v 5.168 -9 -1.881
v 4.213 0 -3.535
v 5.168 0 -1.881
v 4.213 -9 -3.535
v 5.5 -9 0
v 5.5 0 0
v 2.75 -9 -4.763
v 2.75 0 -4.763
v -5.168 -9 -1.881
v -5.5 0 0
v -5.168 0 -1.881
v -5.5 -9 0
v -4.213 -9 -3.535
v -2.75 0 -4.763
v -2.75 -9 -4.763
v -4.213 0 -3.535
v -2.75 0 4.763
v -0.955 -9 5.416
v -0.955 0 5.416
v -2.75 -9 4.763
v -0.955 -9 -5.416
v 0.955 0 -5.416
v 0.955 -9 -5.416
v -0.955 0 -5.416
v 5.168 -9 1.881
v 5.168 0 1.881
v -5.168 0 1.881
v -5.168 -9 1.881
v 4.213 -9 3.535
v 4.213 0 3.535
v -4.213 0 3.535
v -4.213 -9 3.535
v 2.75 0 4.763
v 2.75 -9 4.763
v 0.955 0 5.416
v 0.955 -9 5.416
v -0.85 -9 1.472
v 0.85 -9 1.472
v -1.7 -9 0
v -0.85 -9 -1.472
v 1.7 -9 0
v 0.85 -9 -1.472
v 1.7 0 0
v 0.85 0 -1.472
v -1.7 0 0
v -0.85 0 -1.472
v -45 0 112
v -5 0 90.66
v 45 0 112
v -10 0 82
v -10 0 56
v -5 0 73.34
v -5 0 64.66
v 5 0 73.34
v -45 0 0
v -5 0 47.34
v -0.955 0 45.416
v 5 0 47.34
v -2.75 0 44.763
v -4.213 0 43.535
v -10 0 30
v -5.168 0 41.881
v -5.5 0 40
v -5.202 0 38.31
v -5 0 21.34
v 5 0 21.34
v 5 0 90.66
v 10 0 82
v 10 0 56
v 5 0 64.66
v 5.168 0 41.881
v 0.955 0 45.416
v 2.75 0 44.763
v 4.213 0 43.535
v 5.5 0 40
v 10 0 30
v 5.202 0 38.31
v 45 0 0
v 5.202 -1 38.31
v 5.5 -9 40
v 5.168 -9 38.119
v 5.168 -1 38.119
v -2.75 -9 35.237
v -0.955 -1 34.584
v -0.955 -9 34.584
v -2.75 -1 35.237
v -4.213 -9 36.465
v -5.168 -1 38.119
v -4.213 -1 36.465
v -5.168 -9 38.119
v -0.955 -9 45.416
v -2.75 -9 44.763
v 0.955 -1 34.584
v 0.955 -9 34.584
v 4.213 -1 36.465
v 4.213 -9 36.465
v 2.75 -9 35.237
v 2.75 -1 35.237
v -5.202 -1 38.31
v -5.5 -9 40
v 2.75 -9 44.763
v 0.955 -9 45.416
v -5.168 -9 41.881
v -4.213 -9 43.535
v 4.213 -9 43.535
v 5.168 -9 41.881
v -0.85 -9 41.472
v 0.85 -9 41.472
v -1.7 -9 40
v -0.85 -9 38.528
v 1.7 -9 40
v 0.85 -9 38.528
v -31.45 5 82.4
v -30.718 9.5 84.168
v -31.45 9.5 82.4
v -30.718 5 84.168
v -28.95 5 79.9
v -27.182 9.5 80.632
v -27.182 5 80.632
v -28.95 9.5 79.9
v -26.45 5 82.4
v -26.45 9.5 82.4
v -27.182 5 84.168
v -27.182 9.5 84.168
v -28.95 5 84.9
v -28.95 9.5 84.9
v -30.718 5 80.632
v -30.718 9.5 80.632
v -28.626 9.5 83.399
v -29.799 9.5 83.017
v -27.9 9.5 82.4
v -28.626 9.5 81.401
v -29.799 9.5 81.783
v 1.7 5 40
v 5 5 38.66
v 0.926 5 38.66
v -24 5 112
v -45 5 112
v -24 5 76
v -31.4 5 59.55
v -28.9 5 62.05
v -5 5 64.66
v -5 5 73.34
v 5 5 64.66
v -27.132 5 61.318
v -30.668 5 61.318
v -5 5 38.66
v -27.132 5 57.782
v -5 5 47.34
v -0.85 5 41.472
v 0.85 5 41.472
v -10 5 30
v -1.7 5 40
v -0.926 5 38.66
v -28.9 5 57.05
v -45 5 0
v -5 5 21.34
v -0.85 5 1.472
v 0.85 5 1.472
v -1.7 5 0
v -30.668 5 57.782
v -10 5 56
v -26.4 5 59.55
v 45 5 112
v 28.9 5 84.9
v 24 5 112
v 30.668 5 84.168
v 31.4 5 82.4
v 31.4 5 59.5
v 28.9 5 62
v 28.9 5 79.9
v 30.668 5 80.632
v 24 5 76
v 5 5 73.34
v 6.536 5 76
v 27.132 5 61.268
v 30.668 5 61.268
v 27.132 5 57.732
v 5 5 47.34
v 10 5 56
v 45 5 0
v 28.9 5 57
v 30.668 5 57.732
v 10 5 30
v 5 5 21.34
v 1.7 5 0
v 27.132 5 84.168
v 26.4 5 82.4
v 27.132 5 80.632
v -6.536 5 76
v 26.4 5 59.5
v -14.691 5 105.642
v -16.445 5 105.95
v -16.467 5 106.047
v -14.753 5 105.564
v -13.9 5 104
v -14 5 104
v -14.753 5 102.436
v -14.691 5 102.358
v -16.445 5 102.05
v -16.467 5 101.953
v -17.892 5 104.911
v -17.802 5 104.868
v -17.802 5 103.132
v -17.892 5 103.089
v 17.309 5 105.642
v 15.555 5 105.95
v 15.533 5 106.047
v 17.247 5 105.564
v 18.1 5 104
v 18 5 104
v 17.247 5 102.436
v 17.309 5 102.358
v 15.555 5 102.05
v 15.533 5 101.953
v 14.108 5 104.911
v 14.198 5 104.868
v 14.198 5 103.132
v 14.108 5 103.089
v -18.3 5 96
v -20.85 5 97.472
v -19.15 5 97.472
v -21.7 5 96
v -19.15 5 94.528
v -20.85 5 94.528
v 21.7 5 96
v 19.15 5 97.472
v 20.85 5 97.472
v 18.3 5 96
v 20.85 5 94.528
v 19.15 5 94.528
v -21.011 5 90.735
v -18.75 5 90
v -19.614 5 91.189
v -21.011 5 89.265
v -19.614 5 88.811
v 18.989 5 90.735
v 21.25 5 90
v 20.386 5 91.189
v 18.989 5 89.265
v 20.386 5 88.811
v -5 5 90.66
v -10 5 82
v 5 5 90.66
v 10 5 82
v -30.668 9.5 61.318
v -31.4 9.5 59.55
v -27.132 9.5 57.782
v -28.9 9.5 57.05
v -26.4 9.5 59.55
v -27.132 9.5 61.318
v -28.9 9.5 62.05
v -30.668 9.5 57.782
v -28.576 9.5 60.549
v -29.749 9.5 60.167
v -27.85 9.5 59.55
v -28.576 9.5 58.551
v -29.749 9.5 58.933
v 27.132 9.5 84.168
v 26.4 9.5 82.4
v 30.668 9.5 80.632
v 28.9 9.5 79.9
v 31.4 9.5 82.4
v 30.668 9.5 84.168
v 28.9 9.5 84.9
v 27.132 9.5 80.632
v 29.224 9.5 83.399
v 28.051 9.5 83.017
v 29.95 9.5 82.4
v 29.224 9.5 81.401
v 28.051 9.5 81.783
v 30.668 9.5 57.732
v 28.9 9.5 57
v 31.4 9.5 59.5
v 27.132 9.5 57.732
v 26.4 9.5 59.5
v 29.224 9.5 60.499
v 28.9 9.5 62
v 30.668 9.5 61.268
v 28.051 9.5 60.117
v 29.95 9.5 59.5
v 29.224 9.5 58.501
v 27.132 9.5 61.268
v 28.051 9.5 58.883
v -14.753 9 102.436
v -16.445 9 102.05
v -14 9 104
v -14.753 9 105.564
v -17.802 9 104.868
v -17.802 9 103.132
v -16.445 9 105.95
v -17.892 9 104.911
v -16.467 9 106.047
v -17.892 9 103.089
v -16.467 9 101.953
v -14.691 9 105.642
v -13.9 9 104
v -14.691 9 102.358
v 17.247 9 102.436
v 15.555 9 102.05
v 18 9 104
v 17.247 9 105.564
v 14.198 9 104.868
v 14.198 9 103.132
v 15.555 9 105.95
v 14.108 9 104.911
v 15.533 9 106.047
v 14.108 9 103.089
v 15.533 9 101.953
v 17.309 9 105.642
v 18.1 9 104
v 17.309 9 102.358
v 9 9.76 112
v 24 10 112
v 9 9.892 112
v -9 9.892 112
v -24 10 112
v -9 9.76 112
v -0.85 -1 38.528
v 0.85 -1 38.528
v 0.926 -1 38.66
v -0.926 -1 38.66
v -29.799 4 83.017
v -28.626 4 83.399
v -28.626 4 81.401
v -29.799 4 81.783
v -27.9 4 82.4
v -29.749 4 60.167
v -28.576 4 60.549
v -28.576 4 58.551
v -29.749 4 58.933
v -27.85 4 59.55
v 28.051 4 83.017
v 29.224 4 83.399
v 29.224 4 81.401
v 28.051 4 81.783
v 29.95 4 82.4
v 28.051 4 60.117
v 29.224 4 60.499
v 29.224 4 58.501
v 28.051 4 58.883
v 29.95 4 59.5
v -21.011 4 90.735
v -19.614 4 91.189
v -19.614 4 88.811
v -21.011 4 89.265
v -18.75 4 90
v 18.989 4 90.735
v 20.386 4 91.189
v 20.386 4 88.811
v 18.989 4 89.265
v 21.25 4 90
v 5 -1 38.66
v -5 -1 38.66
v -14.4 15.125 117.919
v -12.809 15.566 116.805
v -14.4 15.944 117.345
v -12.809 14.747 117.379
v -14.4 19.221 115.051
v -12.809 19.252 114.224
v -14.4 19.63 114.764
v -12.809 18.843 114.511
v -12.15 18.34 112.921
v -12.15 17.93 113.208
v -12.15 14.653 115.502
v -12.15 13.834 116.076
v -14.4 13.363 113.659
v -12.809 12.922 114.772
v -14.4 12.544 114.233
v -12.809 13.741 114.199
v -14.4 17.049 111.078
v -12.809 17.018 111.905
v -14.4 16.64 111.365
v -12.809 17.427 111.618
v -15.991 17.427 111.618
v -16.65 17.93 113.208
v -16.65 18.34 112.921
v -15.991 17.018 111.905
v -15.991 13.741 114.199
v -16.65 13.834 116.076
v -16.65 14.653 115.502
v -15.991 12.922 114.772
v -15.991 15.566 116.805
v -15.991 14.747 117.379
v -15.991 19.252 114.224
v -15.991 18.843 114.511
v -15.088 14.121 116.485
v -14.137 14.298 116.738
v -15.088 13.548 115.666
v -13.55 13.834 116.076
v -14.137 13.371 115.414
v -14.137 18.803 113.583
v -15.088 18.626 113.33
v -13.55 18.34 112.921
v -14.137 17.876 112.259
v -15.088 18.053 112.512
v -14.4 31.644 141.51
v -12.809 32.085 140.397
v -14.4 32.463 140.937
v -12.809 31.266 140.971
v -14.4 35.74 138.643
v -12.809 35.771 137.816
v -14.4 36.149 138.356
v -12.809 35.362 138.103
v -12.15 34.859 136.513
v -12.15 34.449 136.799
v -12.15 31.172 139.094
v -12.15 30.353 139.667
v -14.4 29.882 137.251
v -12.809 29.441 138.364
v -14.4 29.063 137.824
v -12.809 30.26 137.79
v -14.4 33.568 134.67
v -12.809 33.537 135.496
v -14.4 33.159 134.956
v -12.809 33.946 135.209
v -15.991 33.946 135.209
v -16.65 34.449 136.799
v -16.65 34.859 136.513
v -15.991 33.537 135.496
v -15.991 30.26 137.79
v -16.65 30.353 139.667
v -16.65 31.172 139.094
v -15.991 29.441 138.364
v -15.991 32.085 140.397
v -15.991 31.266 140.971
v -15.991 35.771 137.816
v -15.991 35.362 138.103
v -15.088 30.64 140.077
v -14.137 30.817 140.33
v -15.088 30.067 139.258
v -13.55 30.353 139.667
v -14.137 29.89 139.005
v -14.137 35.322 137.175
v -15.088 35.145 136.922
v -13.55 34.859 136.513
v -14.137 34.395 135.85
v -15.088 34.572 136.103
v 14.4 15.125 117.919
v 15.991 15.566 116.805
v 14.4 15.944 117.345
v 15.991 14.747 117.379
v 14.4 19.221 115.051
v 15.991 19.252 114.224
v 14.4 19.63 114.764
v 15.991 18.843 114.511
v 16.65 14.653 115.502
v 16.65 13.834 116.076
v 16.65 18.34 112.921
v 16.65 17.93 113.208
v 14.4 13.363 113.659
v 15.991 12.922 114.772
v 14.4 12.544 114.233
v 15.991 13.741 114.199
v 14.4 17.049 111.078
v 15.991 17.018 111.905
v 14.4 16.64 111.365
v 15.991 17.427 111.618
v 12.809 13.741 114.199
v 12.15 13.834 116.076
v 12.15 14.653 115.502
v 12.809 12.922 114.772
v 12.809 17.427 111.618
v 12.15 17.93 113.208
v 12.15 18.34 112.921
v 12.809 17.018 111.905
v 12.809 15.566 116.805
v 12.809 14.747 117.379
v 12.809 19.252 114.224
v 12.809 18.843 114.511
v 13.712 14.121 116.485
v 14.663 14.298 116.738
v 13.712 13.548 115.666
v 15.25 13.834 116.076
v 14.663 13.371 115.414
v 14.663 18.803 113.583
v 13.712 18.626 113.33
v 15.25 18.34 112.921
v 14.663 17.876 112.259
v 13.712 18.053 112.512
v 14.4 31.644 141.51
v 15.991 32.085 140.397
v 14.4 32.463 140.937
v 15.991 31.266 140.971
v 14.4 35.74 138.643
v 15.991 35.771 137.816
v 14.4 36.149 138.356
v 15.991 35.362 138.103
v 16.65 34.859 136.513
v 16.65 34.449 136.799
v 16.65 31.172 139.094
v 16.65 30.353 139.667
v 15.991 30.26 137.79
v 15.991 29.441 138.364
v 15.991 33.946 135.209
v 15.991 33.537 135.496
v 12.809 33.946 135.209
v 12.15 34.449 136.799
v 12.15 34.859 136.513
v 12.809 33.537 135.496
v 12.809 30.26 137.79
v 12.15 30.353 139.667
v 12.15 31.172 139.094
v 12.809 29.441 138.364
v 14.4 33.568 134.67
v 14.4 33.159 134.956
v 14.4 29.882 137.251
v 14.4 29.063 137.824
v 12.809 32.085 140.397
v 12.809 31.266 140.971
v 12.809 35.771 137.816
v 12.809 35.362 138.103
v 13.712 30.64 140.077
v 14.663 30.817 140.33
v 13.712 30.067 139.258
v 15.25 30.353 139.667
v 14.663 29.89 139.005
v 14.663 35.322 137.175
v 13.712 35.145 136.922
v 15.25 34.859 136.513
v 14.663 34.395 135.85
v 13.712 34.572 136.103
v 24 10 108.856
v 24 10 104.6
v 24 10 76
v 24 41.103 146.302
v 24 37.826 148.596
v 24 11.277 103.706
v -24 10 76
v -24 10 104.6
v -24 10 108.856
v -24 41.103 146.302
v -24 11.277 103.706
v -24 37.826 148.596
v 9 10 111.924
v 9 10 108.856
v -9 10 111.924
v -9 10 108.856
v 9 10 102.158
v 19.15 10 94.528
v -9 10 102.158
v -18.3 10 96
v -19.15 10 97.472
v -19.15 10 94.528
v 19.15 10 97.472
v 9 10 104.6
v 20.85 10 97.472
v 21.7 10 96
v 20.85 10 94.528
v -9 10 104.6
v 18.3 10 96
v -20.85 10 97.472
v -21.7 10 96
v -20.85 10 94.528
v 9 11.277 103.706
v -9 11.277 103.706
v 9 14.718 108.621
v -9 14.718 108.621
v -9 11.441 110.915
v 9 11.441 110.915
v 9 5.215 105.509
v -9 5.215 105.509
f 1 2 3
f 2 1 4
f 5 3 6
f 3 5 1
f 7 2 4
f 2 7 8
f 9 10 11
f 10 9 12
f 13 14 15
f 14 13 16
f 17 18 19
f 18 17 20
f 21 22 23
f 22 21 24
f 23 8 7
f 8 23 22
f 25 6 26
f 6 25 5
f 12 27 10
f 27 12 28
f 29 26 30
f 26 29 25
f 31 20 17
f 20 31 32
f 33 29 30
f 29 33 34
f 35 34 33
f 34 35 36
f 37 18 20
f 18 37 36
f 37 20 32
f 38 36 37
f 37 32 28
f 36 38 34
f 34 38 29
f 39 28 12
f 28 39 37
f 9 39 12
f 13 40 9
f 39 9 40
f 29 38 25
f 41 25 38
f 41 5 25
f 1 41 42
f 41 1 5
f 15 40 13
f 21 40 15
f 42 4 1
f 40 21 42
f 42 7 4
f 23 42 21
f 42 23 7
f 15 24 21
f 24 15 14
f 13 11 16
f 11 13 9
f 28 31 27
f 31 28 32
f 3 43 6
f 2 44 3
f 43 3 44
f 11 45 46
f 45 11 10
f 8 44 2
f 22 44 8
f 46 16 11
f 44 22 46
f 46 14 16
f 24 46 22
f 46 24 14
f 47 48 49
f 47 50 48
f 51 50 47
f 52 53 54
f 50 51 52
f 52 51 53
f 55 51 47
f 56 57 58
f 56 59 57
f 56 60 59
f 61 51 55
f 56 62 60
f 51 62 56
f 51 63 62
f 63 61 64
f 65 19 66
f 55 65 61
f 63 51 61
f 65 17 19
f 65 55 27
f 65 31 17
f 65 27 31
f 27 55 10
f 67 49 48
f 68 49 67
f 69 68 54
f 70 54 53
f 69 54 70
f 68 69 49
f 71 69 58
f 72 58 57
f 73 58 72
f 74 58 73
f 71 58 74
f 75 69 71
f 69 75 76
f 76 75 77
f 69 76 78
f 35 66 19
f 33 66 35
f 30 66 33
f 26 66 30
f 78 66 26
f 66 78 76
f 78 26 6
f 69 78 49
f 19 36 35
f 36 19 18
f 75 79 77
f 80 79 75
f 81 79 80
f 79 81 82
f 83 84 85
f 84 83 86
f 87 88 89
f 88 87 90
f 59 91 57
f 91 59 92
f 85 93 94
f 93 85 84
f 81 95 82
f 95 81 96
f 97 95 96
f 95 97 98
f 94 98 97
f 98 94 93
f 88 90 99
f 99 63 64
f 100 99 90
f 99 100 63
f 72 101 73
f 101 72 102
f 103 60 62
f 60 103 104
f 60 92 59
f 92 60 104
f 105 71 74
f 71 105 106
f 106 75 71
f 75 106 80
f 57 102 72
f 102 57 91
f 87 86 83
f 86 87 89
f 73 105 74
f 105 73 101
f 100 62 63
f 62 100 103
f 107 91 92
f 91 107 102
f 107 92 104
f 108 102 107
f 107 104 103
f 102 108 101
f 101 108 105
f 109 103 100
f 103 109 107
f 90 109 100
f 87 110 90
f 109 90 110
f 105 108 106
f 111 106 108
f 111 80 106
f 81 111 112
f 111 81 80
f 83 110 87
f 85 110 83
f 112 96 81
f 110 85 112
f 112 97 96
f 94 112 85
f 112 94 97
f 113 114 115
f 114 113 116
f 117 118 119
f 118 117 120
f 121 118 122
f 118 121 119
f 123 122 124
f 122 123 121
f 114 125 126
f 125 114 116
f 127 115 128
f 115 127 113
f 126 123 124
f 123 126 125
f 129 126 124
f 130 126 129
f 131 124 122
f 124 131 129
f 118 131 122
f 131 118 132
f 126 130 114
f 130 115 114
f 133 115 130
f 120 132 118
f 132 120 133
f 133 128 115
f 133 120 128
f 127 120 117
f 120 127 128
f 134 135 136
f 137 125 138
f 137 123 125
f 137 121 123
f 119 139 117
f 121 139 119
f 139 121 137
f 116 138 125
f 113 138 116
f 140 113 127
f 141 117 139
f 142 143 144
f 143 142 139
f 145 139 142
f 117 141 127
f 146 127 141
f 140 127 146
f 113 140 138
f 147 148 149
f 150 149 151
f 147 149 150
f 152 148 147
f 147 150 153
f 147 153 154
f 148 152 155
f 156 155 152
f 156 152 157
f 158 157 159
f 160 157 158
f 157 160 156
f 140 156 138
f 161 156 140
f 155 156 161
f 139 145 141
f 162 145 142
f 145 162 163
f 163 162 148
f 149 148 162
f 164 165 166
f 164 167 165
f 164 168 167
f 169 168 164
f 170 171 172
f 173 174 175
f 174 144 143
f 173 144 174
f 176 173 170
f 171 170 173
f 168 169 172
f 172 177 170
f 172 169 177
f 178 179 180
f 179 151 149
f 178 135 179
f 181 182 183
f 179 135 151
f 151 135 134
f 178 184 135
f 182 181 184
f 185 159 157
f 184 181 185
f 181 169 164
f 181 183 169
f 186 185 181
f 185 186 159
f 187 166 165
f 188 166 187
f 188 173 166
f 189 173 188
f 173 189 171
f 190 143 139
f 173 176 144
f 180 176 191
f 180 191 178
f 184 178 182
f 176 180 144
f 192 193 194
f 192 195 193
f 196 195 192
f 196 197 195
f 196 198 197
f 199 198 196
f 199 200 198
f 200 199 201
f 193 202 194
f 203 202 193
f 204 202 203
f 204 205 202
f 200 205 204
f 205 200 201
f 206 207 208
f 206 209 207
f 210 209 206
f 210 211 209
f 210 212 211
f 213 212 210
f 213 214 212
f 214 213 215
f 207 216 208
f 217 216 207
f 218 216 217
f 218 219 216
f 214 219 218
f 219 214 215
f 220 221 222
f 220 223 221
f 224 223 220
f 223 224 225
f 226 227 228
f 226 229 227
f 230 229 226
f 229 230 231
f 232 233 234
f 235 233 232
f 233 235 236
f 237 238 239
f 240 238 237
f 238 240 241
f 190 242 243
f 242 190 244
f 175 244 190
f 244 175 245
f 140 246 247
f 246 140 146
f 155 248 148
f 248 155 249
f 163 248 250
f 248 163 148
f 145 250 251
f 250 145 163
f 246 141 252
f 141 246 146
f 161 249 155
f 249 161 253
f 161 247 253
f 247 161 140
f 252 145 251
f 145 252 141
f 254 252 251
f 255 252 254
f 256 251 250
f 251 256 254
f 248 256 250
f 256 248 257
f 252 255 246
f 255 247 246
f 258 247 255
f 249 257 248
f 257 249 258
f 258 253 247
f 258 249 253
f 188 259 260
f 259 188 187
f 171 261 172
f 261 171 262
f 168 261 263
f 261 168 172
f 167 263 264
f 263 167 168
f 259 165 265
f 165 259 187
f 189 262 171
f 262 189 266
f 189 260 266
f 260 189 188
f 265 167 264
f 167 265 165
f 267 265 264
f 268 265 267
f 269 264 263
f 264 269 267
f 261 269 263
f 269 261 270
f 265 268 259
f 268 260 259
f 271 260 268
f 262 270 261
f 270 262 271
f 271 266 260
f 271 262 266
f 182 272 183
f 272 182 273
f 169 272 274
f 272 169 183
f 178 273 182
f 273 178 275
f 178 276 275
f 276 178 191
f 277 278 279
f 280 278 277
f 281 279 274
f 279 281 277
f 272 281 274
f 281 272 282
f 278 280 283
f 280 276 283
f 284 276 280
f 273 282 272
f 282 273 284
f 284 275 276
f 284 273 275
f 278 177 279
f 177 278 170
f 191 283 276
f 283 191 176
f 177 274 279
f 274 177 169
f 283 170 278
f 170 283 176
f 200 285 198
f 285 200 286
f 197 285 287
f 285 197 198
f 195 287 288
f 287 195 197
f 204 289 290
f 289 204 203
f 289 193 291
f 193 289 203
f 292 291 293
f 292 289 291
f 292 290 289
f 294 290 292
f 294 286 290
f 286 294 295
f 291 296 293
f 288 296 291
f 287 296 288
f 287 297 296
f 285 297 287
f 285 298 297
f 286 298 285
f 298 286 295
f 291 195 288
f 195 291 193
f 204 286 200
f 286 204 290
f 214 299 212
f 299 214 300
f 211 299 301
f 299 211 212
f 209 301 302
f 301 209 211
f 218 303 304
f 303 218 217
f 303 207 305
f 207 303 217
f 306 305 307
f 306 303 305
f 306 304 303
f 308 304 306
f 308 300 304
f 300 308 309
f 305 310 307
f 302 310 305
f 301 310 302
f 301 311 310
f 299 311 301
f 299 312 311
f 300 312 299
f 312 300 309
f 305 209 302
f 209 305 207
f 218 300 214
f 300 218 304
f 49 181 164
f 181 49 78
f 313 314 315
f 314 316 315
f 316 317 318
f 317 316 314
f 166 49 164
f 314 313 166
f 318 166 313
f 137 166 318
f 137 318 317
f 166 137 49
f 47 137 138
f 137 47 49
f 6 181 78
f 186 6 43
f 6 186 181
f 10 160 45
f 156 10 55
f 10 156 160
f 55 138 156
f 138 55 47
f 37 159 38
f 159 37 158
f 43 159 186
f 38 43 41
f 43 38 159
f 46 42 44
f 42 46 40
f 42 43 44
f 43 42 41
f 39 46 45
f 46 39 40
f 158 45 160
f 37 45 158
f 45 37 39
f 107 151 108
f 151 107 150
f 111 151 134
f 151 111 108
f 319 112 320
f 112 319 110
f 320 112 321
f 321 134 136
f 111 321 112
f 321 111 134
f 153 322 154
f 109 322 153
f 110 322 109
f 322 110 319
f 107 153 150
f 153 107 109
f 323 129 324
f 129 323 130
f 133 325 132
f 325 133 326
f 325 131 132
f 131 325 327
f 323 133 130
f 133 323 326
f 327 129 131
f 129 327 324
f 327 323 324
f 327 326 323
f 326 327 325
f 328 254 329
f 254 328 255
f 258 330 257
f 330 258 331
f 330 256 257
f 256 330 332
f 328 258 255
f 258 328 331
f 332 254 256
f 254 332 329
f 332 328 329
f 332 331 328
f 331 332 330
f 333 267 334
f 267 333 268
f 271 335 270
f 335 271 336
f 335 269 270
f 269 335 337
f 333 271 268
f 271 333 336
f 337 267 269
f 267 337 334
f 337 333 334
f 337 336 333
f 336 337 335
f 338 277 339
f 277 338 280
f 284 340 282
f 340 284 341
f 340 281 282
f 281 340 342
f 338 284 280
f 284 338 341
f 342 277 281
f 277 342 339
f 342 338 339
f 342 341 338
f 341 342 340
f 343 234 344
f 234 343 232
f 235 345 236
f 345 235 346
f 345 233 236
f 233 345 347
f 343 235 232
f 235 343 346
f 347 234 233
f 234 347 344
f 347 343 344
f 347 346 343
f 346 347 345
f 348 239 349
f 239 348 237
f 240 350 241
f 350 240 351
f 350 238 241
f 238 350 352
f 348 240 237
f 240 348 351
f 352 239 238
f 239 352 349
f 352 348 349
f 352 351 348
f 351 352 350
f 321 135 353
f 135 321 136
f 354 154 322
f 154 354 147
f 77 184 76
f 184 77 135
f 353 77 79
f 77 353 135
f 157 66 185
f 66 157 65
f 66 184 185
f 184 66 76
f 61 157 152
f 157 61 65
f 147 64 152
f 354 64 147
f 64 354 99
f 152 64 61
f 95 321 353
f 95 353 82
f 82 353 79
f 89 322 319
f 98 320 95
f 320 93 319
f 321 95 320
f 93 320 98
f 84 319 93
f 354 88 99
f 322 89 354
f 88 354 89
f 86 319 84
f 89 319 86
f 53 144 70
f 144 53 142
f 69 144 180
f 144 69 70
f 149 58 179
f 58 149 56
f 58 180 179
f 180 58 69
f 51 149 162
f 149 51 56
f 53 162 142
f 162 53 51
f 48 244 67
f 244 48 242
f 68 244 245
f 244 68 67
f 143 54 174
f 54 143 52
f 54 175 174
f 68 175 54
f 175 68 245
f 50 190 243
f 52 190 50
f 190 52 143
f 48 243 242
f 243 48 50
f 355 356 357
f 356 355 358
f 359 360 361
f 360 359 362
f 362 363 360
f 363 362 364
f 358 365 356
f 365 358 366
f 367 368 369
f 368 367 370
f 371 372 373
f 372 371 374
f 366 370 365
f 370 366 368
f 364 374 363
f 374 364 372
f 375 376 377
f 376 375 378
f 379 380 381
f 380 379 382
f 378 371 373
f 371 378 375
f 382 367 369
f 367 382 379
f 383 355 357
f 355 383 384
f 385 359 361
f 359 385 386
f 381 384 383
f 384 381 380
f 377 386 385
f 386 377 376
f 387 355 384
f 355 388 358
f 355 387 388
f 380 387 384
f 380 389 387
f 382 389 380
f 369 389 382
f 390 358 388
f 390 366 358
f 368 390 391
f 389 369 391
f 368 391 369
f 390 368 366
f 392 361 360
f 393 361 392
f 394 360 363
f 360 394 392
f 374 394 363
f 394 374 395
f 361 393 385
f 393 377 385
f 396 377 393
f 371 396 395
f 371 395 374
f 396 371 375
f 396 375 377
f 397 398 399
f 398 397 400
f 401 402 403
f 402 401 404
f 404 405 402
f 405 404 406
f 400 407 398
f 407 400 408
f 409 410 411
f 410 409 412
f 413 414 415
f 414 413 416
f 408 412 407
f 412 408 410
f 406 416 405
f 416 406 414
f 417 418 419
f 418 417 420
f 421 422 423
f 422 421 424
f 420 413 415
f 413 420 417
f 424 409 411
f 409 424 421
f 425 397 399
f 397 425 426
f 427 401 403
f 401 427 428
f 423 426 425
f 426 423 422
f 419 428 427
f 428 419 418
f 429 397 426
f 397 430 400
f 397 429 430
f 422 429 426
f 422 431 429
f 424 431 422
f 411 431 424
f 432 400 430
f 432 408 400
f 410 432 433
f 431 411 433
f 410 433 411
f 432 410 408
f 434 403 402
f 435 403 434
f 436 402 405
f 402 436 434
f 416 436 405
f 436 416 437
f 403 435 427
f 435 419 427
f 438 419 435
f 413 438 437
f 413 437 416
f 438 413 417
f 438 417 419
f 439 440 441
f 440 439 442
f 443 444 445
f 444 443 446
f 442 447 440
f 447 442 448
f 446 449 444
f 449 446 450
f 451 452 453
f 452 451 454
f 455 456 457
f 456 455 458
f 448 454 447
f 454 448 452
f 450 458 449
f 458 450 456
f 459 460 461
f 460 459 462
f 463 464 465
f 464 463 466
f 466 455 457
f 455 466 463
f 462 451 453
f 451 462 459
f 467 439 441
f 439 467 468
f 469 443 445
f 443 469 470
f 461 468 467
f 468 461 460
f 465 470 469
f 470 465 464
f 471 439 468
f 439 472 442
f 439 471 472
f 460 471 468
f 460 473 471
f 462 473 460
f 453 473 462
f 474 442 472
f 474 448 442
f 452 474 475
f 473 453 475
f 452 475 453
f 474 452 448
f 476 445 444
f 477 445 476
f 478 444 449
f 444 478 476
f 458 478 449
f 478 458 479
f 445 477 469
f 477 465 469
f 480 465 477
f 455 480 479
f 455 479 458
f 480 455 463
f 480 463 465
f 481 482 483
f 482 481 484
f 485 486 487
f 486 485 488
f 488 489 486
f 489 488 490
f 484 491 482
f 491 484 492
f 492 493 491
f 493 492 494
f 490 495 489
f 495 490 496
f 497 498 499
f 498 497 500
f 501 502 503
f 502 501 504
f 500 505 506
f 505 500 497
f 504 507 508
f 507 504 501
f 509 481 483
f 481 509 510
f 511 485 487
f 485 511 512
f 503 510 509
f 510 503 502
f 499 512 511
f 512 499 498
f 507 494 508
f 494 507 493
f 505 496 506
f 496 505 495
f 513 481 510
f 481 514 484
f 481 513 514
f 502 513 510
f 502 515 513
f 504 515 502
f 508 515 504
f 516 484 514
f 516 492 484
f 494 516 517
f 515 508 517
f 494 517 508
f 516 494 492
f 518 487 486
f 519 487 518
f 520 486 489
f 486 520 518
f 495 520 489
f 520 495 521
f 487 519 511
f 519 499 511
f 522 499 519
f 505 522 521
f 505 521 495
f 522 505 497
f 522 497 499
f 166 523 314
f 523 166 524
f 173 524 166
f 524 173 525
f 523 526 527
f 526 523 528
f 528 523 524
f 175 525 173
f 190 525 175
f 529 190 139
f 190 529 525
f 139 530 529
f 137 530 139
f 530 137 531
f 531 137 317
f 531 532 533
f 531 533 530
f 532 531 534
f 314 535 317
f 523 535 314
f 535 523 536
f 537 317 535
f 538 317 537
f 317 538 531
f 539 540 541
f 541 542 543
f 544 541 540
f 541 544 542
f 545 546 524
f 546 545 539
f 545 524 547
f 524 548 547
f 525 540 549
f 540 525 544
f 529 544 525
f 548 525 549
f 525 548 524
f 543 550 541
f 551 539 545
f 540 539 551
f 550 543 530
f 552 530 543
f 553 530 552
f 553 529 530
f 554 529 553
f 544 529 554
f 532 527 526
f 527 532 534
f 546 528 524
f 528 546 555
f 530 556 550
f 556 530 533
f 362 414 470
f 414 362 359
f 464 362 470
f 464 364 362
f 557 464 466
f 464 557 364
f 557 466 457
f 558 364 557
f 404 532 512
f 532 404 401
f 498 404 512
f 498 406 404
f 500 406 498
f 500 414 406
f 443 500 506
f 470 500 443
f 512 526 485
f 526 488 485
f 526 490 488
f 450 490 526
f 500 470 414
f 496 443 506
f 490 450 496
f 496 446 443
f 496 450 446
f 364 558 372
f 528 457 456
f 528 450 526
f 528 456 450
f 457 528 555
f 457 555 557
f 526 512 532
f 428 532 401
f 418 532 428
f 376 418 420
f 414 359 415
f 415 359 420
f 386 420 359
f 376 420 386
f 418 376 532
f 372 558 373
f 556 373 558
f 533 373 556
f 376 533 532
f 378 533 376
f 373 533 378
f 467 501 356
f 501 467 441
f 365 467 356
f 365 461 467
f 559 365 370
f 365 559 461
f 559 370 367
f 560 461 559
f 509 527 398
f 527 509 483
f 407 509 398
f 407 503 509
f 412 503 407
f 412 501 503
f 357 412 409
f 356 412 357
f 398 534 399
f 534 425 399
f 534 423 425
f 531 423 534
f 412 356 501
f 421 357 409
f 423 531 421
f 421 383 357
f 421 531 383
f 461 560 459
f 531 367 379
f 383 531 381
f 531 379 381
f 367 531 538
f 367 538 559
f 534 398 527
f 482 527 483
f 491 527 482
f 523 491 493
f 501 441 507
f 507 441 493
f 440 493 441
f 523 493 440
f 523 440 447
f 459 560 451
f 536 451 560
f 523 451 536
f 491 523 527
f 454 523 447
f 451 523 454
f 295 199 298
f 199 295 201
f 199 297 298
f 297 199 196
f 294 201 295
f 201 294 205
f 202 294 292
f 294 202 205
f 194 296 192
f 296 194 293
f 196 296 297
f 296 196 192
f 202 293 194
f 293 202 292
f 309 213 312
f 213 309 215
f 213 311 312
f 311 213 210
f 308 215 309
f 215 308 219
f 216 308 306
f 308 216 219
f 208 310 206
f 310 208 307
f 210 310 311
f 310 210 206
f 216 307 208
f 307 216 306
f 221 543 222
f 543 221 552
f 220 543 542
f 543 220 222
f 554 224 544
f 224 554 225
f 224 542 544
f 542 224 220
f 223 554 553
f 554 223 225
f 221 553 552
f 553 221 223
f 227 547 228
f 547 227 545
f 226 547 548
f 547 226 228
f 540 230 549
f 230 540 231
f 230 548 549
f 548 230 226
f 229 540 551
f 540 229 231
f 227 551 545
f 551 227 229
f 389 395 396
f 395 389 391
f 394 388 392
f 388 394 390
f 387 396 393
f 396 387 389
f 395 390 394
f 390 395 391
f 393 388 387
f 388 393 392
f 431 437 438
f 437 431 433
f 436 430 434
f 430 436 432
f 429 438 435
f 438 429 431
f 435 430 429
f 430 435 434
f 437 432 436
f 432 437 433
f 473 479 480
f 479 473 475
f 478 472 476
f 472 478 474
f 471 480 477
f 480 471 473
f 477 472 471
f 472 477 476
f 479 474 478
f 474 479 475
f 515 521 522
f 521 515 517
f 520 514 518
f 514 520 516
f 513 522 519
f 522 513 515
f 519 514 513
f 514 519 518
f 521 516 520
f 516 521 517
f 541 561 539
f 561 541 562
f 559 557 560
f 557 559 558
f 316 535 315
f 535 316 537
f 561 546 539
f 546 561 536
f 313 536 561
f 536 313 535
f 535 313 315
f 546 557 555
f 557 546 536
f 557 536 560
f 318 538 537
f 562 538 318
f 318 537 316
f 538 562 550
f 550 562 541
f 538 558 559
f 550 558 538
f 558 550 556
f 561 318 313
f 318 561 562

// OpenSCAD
// Sentinel V3B — TWO-PIECE, ZERO-SUPPORT bracket for Ender-3 V3 SE
// 2026-08-17. Split from V3 because the one-piece lean slab cantilevered
// 40mm past the plate top (Orca: "floating cantilever"). Two pieces:
//
//   PLATE  — vertical plate, standoff bosses (cap screws 40mm o/c vertical),
//            Zero 3W cradle on the face, 2 locating pins + 2 M3 pilots near
//            the top for the wedge. Prints FLAT (rotY? no — rotX: see below).
//   WEDGE  — foot (screws to plate top) + 35° lean slab carrying the camera
//            face (36x36 board, 28.8 grid, lens bore). Prints flat, lean is
//            35° from vertical (< 45°) => zero supports.
//
// INSTALL: +Y faces the bed. Plate bolts to cap via standoffs. Wedge foot
// laps the plate face, 2x M3 self-tap into pilots, 2 locating pins align.
// Camera board on the lean face, ports/ribbon run down to the Zero 3W.
//
// part = "plate" | "wedge" | "print_plate" | "print_wedge" | "preview"

part = "preview"; // [plate, wedge, print_plate, print_wedge, preview]

/* [Cap interface — MEASURED 2026-08-16/17] */
screw_spacing = 40.0;   // cap screws, VERTICAL, one above the other
standoff     = 9.0;     // plate back -> cap face
screw_pilot  = 3.4;     // M3 clearance

/* [Hardware] */
cam_pilot = 1.7;        // M2 self-tap (camera posts)
z3w_pilot = 2.1;        // M2.5 self-tap (Zero 3W bosses)
wedge_screw = 2.5;      // M3 self-tap pilot in plate (wedge foot)

/* [Zero 3W — Radxa v1.11 DXF] */
z3w_x = 65.0; z3w_y = 30.0;
z3w_holes = [[3.55,3.60],[3.60,26.45],[61.40,3.60],[61.40,26.50]];

/* [Camera — measured] */
cam_grid = 28.8; lens_d = 17.0;
cam_lean = 35.0;        // < 45 => prints without support

/* [Structure] */
plate_t = 5.0;          // plate thickness (Y)
plate_w = 90.0;         // plate width (X)
plate_h = 112.0;        // plate height (Z)
boss_h  = 4.5;          // Zero 3W boss height
z0      = 56.0;         // board bottom edge height

// wedge geometry
foot_w  = 48.0;         // foot width (X)
foot_h  = 36.0;         // foot height (Z, laps the plate face)
foot_t  = 5.0;          // foot thickness (Y)
slab_len = 52.0;        // lean slab length along its face
slab_t  = 4.0;          // slab thickness
cam_zc_local = 26.0;    // camera center along slab face
wedge_screw_z = 20.0;   // screw height up the foot (local)

// ===============================================================
module plate() {
    difference() {
        union() {
            translate([-plate_w/2, 0, 0]) cube([plate_w, plate_t, plate_h]);
            for (sz = [0, screw_spacing])
                translate([0, -standoff, sz]) rotate([-90,0,0])
                    cylinder(d = 11, h = standoff);
            for (hxy = z3w_holes)
                translate([hxy[0]-z3w_x/2, plate_t, z0 + (z3w_y - hxy[1])])
                    rotate([-90,0,0]) cylinder(d=5, h=boss_h);
            // locating pins for the wedge (2x, 4mm, at foot top corners)
            for (px = [-16, 16])
                translate([px, plate_t, plate_h - 8]) rotate([-90,0,0])
                    cylinder(d = 4, h = 4);
        }
        for (sz = [0, screw_spacing])
            translate([0, -standoff - 1, sz])
                rotate([-90,0,0]) cylinder(d = screw_pilot, h = standoff + plate_t + 2);
        for (hxy = z3w_holes)
            translate([hxy[0]-z3w_x/2, plate_t - 1, z0 + (z3w_y - hxy[1])])
                rotate([-90,0,0]) cylinder(d = z3w_pilot, h = boss_h + 2);
        // wedge M3 self-tap pilots (2x at x=+-20, z=plate_h-... local foot)
        for (px = [-20, 20])
            translate([px, plate_t - 1, plate_h - 22]) rotate([-90,0,0])
                cylinder(d = wedge_screw, h = 5);
        // lightening windows
        for (zz = [30, 56, 82])
            translate([0, -1, zz]) rotate([-90,0,0])
                cylinder(d = 20, h = plate_t + 2, $fn = 6);
    }
}

// ===============================================================
module wedge() {
    // foot: vertical plate laps the main plate face (Y 0..foot_t),
    // X -foot_w/2.., Z 0..foot_h. Pins/screws on the -Y face.
    difference() {
        union() {
            translate([-foot_w/2, 0, 0]) cube([foot_w, foot_t, foot_h]);
            // lean slab from foot top edge, leaning +Y at cam_lean
            translate([-foot_w/2, foot_t - 2, foot_h - 6]) rotate([-cam_lean, 0, 0])
                translate([0, 0, 0]) cube([foot_w, slab_t, slab_len]);   // bites 2mm into foot
            // camera posts on slab -Y face (lens side faces +Y/down at bed)
            translate([-foot_w/2, foot_t - 2, foot_h - 6]) rotate([-cam_lean, 0, 0])
                for (sx = [-cam_grid/2, cam_grid/2], sz = [-cam_grid/2, cam_grid/2])
                    translate([foot_w/2 + sx, 4.5, cam_zc_local + sz]) rotate([90,0,0])
                        cylinder(d = 4.5, h = 5.5);   // bite 4mm into slab
        }
        // pin holes on foot -Y face (align to plate pins)
        for (px = [-16, 16])
            translate([px, -1, foot_h - 8]) rotate([-90,0,0])
                cylinder(d = 4.2, h = 5);
        // screw clearance through foot (M3)
        for (px = [-20, 20])
            translate([px, -1, wedge_screw_z]) rotate([-90,0,0])
                cylinder(d = 3.4, h = foot_t + 2);
        // lens bore through the lean slab
        translate([-foot_w/2, foot_t - 2, foot_h - 6]) rotate([-cam_lean,0,0])
            translate([foot_w/2, -6, cam_zc_local]) rotate([90,0,0])
                cylinder(d = lens_d, h = slab_t + 12);
        // camera post pilots
        translate([-foot_w/2, foot_t - 2, foot_h - 6]) rotate([-cam_lean,0,0])
            for (sx = [-cam_grid/2, cam_grid/2], sz = [-cam_grid/2, cam_grid/2])
                translate([foot_w/2 + sx, 6, cam_zc_local + sz]) rotate([90,0,0])
                    cylinder(d = cam_pilot, h = 8);
        // ribbon slot through slab bottom edge
        translate([-foot_w/2, foot_t - 2, foot_h - 6]) rotate([-cam_lean,0,0])
            translate([foot_w/2 - 9, -2, -2]) cube([18, 8, 8]);
    }
}

// ===============================================================
if (part == "plate") plate();
if (part == "wedge") wedge();
if (part == "print_plate") rotate([90, 0, 0]) plate();   // plate FACE flat on bed
if (part == "print_wedge") rotate([90, 0, 0]) wedge();   // foot FACE flat on bed
if (part == "preview") {
    color([0.1, 0.1, 0.11]) plate();
    color([0.95, 0.95, 0.93])
        translate([0, plate_t, plate_h - foot_h]) wedge();
}
